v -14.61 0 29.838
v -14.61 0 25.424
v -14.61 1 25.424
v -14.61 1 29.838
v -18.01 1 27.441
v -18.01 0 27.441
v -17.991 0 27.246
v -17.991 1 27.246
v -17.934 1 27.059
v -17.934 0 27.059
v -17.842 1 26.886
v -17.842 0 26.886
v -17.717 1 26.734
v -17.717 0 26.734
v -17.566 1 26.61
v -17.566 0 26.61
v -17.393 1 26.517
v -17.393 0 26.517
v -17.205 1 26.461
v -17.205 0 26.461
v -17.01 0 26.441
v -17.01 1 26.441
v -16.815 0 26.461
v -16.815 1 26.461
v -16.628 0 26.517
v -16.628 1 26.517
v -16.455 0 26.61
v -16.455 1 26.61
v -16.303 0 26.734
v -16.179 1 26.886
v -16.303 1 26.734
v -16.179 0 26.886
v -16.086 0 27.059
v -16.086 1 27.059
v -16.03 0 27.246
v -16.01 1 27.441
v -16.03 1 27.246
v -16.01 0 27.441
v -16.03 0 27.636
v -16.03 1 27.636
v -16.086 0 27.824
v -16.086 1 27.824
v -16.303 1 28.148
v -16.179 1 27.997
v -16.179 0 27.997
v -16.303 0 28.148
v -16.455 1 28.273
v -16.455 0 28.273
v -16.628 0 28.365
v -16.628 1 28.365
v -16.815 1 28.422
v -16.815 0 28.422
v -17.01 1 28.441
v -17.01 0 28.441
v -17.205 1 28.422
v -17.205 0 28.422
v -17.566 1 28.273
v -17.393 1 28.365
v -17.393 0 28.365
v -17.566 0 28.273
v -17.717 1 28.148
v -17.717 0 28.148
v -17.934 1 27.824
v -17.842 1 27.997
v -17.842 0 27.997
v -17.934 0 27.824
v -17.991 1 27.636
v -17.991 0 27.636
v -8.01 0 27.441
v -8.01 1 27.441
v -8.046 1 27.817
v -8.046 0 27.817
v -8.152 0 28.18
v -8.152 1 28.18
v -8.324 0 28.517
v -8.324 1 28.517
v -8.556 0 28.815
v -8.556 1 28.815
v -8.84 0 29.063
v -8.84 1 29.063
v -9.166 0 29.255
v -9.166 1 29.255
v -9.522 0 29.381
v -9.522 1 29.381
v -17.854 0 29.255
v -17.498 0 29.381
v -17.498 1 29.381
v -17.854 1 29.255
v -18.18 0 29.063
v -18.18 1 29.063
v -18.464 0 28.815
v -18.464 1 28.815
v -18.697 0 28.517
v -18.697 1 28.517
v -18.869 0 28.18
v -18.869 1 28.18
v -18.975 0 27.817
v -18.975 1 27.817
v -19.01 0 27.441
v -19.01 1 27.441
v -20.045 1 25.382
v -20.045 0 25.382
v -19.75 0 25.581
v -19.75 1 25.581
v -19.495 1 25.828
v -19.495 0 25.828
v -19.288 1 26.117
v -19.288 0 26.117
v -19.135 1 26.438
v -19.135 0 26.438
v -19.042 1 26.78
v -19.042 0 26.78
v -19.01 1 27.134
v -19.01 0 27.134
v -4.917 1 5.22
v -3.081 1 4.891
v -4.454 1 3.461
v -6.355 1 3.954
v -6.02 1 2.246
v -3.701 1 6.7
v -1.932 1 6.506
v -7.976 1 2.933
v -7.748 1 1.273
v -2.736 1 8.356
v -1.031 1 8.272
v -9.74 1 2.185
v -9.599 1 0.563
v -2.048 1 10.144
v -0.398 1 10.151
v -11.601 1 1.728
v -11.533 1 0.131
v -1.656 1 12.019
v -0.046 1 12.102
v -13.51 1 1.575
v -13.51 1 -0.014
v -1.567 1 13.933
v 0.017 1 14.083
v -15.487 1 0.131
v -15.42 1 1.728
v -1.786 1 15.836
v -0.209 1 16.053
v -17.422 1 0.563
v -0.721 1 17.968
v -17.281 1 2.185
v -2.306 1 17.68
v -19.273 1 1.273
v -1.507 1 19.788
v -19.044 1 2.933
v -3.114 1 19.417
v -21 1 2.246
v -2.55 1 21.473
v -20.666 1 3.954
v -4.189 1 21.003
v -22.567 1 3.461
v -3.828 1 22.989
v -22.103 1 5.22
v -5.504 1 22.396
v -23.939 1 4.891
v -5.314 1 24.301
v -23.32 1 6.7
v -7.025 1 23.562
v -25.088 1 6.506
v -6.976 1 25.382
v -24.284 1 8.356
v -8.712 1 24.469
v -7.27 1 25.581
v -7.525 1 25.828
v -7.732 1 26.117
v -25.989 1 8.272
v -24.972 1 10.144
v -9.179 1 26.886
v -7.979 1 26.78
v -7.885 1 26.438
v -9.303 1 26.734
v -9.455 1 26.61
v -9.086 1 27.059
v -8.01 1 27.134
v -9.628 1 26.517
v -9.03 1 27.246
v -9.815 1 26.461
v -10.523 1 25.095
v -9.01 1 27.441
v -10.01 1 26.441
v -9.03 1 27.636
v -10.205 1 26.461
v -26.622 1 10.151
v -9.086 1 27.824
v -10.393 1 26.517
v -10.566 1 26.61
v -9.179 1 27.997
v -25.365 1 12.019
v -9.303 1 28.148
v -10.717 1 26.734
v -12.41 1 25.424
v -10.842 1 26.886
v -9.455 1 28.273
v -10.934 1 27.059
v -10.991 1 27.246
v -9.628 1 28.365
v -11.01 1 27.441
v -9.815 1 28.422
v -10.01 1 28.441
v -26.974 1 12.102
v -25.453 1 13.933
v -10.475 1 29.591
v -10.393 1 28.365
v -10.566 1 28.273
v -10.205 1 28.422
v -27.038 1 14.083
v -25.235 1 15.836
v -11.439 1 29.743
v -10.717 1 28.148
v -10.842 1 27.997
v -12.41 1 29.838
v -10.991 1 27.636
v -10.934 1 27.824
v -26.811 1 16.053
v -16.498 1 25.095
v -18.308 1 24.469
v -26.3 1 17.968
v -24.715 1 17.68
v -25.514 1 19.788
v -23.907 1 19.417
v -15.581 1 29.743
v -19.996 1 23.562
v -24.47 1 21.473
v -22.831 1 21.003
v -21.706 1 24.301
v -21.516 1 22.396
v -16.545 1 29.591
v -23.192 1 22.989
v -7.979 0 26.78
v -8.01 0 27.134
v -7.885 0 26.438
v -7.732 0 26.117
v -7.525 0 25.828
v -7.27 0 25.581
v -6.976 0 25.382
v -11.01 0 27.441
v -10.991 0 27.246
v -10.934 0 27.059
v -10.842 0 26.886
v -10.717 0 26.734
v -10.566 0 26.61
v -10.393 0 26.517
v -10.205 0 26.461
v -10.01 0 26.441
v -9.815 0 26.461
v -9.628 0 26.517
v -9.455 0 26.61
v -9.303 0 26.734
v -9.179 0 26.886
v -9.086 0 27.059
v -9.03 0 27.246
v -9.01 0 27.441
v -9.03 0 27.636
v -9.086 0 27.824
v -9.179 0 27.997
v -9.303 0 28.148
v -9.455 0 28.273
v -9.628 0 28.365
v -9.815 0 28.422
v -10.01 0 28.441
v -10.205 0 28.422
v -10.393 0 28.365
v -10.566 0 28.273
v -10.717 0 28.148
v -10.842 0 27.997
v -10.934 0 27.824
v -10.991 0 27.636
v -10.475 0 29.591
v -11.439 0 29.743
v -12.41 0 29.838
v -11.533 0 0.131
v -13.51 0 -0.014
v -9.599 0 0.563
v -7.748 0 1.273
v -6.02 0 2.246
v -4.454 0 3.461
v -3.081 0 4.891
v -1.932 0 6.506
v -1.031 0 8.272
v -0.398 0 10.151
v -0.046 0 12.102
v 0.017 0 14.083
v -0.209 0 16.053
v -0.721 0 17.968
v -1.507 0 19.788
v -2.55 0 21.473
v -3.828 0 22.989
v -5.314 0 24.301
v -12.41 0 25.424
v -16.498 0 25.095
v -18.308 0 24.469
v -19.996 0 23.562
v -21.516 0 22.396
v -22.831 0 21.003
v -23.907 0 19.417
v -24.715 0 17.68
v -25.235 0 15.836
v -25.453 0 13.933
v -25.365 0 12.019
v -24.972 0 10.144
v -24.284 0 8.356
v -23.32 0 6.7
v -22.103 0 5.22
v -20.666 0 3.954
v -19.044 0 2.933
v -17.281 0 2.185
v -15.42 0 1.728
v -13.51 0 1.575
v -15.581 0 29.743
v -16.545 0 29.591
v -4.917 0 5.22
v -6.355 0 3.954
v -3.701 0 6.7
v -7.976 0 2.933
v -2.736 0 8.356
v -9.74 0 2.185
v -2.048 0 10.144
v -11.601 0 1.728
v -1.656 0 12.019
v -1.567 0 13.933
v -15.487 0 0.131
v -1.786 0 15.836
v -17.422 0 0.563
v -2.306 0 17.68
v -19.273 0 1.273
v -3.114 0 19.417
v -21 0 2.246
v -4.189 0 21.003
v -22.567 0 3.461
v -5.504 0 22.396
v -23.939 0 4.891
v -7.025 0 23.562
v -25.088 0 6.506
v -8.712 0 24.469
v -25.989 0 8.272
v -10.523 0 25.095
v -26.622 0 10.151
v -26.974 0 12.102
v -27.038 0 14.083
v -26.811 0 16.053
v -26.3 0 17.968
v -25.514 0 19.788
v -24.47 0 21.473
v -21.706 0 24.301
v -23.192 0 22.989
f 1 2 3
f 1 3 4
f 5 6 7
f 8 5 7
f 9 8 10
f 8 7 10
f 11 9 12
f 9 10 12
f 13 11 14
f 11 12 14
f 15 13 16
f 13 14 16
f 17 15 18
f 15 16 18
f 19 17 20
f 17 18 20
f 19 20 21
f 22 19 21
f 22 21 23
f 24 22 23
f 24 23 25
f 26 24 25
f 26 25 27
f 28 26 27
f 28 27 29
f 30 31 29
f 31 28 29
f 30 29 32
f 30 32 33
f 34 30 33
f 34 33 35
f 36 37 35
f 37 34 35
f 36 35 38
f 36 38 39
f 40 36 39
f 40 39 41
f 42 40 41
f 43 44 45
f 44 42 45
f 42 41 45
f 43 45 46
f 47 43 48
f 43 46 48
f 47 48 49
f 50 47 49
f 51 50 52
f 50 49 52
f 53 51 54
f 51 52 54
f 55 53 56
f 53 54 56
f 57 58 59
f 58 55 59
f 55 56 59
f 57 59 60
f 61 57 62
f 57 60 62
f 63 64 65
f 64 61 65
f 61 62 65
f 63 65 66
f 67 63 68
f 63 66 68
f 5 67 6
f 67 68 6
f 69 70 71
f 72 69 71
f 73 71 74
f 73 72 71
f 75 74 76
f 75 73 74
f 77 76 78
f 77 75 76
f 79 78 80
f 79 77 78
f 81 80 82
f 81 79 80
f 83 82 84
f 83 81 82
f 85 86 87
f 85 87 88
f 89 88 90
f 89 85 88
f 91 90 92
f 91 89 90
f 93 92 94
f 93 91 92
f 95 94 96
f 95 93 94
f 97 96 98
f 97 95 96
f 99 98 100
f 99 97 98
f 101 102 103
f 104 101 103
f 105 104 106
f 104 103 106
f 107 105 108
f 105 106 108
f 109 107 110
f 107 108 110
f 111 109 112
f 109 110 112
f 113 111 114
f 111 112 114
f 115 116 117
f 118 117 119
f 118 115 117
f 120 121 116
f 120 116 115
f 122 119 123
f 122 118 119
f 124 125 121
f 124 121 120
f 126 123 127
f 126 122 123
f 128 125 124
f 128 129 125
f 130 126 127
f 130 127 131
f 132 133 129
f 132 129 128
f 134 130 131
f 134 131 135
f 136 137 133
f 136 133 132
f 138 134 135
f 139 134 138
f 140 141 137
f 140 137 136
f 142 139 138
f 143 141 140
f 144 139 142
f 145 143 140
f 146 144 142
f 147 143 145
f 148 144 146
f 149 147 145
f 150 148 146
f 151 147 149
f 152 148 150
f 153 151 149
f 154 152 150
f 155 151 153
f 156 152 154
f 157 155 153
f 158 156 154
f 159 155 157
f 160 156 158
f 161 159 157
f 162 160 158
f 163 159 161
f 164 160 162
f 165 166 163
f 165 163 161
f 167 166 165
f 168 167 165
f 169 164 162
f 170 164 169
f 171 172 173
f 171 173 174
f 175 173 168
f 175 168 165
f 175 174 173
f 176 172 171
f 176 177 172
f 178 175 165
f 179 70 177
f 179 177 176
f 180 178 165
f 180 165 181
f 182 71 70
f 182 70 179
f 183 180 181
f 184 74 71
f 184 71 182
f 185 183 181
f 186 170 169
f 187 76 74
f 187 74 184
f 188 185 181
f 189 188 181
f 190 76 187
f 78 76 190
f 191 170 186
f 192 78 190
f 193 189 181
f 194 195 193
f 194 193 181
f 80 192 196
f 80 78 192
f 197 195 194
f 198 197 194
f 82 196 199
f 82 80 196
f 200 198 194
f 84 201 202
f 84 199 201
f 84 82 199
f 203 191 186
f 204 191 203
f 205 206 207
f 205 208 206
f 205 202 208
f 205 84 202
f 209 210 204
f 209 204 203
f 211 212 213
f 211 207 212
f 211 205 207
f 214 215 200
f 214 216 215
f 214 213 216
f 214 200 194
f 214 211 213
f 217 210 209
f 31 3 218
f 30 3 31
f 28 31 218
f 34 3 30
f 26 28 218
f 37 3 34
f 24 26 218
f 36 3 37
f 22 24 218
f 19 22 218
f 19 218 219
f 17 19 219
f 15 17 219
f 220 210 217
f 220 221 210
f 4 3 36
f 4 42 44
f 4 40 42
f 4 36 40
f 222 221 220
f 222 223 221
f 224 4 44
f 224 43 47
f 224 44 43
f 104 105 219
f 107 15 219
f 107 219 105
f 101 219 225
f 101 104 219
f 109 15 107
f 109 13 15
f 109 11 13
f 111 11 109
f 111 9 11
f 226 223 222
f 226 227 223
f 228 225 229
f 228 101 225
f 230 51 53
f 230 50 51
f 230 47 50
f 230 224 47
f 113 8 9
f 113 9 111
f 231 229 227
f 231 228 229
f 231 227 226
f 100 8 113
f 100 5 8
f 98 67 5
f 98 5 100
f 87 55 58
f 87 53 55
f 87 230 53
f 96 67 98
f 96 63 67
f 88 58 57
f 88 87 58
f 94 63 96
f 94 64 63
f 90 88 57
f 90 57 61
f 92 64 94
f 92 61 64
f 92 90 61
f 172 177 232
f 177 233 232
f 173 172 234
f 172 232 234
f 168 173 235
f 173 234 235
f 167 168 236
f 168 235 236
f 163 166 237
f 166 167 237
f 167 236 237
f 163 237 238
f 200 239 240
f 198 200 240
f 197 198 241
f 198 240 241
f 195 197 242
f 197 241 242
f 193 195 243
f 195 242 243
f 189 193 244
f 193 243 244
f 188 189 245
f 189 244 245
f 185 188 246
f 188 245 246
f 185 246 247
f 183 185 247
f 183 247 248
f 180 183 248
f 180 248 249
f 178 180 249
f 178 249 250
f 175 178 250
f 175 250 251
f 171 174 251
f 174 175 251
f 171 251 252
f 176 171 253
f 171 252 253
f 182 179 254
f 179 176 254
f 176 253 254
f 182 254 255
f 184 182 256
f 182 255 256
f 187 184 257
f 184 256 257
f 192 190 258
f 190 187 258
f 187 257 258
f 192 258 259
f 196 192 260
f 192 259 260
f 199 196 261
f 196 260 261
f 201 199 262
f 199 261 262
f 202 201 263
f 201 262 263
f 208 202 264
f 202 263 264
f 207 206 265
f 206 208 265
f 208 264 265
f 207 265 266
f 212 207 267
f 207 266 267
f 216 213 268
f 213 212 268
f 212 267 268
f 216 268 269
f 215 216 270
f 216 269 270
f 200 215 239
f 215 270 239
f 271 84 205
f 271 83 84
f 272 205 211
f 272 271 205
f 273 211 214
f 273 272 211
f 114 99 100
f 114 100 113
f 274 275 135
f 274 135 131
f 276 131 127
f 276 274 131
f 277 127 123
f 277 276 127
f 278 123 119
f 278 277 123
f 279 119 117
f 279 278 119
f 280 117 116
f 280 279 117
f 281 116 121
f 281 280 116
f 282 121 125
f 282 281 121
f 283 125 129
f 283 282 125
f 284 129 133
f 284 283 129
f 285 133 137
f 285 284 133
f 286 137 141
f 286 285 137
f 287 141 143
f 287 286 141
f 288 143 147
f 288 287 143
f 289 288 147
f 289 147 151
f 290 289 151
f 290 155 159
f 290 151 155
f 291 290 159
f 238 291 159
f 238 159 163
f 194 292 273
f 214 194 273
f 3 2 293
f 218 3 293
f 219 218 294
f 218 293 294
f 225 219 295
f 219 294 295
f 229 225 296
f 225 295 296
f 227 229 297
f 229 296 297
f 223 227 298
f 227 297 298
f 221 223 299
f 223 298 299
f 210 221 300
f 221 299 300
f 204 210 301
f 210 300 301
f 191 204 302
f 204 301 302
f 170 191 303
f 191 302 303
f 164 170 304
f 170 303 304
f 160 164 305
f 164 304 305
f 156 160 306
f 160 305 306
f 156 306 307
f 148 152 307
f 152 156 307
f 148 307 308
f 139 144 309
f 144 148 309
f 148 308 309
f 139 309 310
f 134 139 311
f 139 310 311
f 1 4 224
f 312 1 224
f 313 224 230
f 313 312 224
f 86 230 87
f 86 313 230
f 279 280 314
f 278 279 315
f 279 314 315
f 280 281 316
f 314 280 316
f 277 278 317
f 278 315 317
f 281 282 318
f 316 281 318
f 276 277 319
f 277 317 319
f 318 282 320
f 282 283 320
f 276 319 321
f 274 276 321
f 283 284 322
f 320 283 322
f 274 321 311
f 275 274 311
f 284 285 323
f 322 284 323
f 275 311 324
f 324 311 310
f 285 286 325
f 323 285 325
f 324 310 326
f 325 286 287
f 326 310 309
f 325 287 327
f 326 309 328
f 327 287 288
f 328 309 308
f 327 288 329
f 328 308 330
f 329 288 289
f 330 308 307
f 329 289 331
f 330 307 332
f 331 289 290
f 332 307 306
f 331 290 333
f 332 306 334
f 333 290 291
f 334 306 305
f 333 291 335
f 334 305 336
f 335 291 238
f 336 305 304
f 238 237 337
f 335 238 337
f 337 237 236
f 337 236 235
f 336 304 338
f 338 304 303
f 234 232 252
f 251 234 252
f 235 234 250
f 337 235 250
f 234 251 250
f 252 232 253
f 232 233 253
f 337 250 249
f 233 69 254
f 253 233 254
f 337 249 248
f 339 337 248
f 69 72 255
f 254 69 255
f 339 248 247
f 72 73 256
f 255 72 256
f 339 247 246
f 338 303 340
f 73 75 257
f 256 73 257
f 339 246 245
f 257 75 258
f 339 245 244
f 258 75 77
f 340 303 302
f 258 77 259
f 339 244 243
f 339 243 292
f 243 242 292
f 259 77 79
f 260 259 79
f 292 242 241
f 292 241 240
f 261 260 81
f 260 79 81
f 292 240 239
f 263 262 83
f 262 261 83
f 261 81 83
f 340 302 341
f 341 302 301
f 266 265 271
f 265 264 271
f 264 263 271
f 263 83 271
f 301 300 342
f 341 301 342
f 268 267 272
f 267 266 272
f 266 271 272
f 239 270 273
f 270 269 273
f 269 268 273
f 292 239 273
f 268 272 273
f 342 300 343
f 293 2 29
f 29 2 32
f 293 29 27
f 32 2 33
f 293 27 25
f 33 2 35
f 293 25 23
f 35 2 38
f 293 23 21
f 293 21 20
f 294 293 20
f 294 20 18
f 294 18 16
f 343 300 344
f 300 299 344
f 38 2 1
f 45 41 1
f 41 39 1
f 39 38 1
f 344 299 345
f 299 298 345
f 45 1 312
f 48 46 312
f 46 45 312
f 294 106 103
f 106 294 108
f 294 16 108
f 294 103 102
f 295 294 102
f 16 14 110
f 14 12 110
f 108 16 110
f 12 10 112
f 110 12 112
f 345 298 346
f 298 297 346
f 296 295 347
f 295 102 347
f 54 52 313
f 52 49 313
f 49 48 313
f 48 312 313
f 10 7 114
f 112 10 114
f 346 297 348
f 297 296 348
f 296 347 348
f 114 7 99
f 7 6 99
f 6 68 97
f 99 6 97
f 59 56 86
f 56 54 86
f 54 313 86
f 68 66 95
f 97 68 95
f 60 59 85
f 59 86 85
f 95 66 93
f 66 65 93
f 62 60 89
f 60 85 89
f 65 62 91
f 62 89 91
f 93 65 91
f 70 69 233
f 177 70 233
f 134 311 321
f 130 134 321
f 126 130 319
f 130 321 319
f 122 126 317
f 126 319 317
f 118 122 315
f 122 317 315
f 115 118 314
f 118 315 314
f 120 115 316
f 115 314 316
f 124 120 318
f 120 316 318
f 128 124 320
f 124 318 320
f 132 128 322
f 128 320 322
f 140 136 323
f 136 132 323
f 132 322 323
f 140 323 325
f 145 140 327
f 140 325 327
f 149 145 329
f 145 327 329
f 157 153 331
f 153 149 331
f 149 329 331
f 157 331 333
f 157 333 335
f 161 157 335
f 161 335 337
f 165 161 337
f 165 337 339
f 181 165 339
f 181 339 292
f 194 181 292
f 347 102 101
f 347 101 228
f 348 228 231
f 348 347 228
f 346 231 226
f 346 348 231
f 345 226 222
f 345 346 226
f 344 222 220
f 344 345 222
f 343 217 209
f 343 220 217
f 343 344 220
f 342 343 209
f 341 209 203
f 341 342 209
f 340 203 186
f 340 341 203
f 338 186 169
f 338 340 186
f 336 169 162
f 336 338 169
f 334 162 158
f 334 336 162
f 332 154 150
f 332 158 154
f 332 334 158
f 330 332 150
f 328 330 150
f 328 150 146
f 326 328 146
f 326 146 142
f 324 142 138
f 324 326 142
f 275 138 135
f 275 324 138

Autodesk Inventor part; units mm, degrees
ref_plane "YZ Plane" through (0, 0, 0) normal (1, 0, 0) x (0, 1, 0)
ref_plane "XZ Plane" through (0, 0, 0) normal (0, 1, 0) x (-1, 0, 0)
ref_plane "XY Plane" through (0, 0, 0) normal (0, 0, 1) x (1, 0, 0)
sketch "Sketch1" plane through (0, 0, 0) normal (0, 1, 0) x (-1, 0, 0)
  line L0 (8.0103, 27.4413) -> (8.0103, 27.134)
  line L1 (12.4103, 25.424) -> (12.4103, 29.8377)
  circle A0 centre (10.0103, 27.4413) radius 1
  arc A1 (12.4103, 25.424) -> (13.5103, 1.5747) centre (13.5103, 13.5247) ccw
  arc A2 (6.9756, 25.3824) -> (13.5103, -0.0144) centre (13.5103, 13.5247) ccw
  arc A3 (6.9756, 25.3824) -> (8.0103, 27.134) centre (6.0103, 27.134) ccw
  arc A4 (9.5225, 29.3809) -> (8.0103, 27.4413) centre (10.0103, 27.4413) ccw
  arc A5 (12.4103, 29.8377) -> (9.5225, 29.3809) centre (13.5103, 13.5247) ccw
  line L2 (13.5103, 34.3082) -> (13.5103, -8.904)
  line L3 (19.0103, 27.4413) -> (19.0103, 27.134)
  line L4 (14.6103, 25.424) -> (14.6103, 29.8377)
  circle A6 centre (17.0103, 27.4413) radius 1
  arc A7 (13.5103, 1.5747) -> (14.6103, 25.424) centre (13.5103, 13.5247) ccw
  arc A8 (13.5103, -0.0144) -> (20.045, 25.3824) centre (13.5103, 13.5247) ccw
  arc A9 (19.0103, 27.134) -> (20.045, 25.3824) centre (21.0103, 27.134) ccw
  arc A10 (19.0103, 27.4413) -> (17.4981, 29.3809) centre (17.0103, 27.4413) ccw
  arc A11 (17.4981, 29.3809) -> (14.6103, 29.8377) centre (13.5103, 13.5247) ccw
  point P0 (0, 0)
  point P1 (12.4103, 27.6308)
  point P2 (14.6103, 27.6308)
  dimension "d0" = 11.95
  dimension "d1" = 13.5391
  dimension "d4" = 2.4
  dimension "d6" = 2
  dimension "d7" = 2
  dimension "d8" = 2
extrude "Extrusion1" add sketch "Sketch1" along normal blind 1
properties part number "49-01-002"
